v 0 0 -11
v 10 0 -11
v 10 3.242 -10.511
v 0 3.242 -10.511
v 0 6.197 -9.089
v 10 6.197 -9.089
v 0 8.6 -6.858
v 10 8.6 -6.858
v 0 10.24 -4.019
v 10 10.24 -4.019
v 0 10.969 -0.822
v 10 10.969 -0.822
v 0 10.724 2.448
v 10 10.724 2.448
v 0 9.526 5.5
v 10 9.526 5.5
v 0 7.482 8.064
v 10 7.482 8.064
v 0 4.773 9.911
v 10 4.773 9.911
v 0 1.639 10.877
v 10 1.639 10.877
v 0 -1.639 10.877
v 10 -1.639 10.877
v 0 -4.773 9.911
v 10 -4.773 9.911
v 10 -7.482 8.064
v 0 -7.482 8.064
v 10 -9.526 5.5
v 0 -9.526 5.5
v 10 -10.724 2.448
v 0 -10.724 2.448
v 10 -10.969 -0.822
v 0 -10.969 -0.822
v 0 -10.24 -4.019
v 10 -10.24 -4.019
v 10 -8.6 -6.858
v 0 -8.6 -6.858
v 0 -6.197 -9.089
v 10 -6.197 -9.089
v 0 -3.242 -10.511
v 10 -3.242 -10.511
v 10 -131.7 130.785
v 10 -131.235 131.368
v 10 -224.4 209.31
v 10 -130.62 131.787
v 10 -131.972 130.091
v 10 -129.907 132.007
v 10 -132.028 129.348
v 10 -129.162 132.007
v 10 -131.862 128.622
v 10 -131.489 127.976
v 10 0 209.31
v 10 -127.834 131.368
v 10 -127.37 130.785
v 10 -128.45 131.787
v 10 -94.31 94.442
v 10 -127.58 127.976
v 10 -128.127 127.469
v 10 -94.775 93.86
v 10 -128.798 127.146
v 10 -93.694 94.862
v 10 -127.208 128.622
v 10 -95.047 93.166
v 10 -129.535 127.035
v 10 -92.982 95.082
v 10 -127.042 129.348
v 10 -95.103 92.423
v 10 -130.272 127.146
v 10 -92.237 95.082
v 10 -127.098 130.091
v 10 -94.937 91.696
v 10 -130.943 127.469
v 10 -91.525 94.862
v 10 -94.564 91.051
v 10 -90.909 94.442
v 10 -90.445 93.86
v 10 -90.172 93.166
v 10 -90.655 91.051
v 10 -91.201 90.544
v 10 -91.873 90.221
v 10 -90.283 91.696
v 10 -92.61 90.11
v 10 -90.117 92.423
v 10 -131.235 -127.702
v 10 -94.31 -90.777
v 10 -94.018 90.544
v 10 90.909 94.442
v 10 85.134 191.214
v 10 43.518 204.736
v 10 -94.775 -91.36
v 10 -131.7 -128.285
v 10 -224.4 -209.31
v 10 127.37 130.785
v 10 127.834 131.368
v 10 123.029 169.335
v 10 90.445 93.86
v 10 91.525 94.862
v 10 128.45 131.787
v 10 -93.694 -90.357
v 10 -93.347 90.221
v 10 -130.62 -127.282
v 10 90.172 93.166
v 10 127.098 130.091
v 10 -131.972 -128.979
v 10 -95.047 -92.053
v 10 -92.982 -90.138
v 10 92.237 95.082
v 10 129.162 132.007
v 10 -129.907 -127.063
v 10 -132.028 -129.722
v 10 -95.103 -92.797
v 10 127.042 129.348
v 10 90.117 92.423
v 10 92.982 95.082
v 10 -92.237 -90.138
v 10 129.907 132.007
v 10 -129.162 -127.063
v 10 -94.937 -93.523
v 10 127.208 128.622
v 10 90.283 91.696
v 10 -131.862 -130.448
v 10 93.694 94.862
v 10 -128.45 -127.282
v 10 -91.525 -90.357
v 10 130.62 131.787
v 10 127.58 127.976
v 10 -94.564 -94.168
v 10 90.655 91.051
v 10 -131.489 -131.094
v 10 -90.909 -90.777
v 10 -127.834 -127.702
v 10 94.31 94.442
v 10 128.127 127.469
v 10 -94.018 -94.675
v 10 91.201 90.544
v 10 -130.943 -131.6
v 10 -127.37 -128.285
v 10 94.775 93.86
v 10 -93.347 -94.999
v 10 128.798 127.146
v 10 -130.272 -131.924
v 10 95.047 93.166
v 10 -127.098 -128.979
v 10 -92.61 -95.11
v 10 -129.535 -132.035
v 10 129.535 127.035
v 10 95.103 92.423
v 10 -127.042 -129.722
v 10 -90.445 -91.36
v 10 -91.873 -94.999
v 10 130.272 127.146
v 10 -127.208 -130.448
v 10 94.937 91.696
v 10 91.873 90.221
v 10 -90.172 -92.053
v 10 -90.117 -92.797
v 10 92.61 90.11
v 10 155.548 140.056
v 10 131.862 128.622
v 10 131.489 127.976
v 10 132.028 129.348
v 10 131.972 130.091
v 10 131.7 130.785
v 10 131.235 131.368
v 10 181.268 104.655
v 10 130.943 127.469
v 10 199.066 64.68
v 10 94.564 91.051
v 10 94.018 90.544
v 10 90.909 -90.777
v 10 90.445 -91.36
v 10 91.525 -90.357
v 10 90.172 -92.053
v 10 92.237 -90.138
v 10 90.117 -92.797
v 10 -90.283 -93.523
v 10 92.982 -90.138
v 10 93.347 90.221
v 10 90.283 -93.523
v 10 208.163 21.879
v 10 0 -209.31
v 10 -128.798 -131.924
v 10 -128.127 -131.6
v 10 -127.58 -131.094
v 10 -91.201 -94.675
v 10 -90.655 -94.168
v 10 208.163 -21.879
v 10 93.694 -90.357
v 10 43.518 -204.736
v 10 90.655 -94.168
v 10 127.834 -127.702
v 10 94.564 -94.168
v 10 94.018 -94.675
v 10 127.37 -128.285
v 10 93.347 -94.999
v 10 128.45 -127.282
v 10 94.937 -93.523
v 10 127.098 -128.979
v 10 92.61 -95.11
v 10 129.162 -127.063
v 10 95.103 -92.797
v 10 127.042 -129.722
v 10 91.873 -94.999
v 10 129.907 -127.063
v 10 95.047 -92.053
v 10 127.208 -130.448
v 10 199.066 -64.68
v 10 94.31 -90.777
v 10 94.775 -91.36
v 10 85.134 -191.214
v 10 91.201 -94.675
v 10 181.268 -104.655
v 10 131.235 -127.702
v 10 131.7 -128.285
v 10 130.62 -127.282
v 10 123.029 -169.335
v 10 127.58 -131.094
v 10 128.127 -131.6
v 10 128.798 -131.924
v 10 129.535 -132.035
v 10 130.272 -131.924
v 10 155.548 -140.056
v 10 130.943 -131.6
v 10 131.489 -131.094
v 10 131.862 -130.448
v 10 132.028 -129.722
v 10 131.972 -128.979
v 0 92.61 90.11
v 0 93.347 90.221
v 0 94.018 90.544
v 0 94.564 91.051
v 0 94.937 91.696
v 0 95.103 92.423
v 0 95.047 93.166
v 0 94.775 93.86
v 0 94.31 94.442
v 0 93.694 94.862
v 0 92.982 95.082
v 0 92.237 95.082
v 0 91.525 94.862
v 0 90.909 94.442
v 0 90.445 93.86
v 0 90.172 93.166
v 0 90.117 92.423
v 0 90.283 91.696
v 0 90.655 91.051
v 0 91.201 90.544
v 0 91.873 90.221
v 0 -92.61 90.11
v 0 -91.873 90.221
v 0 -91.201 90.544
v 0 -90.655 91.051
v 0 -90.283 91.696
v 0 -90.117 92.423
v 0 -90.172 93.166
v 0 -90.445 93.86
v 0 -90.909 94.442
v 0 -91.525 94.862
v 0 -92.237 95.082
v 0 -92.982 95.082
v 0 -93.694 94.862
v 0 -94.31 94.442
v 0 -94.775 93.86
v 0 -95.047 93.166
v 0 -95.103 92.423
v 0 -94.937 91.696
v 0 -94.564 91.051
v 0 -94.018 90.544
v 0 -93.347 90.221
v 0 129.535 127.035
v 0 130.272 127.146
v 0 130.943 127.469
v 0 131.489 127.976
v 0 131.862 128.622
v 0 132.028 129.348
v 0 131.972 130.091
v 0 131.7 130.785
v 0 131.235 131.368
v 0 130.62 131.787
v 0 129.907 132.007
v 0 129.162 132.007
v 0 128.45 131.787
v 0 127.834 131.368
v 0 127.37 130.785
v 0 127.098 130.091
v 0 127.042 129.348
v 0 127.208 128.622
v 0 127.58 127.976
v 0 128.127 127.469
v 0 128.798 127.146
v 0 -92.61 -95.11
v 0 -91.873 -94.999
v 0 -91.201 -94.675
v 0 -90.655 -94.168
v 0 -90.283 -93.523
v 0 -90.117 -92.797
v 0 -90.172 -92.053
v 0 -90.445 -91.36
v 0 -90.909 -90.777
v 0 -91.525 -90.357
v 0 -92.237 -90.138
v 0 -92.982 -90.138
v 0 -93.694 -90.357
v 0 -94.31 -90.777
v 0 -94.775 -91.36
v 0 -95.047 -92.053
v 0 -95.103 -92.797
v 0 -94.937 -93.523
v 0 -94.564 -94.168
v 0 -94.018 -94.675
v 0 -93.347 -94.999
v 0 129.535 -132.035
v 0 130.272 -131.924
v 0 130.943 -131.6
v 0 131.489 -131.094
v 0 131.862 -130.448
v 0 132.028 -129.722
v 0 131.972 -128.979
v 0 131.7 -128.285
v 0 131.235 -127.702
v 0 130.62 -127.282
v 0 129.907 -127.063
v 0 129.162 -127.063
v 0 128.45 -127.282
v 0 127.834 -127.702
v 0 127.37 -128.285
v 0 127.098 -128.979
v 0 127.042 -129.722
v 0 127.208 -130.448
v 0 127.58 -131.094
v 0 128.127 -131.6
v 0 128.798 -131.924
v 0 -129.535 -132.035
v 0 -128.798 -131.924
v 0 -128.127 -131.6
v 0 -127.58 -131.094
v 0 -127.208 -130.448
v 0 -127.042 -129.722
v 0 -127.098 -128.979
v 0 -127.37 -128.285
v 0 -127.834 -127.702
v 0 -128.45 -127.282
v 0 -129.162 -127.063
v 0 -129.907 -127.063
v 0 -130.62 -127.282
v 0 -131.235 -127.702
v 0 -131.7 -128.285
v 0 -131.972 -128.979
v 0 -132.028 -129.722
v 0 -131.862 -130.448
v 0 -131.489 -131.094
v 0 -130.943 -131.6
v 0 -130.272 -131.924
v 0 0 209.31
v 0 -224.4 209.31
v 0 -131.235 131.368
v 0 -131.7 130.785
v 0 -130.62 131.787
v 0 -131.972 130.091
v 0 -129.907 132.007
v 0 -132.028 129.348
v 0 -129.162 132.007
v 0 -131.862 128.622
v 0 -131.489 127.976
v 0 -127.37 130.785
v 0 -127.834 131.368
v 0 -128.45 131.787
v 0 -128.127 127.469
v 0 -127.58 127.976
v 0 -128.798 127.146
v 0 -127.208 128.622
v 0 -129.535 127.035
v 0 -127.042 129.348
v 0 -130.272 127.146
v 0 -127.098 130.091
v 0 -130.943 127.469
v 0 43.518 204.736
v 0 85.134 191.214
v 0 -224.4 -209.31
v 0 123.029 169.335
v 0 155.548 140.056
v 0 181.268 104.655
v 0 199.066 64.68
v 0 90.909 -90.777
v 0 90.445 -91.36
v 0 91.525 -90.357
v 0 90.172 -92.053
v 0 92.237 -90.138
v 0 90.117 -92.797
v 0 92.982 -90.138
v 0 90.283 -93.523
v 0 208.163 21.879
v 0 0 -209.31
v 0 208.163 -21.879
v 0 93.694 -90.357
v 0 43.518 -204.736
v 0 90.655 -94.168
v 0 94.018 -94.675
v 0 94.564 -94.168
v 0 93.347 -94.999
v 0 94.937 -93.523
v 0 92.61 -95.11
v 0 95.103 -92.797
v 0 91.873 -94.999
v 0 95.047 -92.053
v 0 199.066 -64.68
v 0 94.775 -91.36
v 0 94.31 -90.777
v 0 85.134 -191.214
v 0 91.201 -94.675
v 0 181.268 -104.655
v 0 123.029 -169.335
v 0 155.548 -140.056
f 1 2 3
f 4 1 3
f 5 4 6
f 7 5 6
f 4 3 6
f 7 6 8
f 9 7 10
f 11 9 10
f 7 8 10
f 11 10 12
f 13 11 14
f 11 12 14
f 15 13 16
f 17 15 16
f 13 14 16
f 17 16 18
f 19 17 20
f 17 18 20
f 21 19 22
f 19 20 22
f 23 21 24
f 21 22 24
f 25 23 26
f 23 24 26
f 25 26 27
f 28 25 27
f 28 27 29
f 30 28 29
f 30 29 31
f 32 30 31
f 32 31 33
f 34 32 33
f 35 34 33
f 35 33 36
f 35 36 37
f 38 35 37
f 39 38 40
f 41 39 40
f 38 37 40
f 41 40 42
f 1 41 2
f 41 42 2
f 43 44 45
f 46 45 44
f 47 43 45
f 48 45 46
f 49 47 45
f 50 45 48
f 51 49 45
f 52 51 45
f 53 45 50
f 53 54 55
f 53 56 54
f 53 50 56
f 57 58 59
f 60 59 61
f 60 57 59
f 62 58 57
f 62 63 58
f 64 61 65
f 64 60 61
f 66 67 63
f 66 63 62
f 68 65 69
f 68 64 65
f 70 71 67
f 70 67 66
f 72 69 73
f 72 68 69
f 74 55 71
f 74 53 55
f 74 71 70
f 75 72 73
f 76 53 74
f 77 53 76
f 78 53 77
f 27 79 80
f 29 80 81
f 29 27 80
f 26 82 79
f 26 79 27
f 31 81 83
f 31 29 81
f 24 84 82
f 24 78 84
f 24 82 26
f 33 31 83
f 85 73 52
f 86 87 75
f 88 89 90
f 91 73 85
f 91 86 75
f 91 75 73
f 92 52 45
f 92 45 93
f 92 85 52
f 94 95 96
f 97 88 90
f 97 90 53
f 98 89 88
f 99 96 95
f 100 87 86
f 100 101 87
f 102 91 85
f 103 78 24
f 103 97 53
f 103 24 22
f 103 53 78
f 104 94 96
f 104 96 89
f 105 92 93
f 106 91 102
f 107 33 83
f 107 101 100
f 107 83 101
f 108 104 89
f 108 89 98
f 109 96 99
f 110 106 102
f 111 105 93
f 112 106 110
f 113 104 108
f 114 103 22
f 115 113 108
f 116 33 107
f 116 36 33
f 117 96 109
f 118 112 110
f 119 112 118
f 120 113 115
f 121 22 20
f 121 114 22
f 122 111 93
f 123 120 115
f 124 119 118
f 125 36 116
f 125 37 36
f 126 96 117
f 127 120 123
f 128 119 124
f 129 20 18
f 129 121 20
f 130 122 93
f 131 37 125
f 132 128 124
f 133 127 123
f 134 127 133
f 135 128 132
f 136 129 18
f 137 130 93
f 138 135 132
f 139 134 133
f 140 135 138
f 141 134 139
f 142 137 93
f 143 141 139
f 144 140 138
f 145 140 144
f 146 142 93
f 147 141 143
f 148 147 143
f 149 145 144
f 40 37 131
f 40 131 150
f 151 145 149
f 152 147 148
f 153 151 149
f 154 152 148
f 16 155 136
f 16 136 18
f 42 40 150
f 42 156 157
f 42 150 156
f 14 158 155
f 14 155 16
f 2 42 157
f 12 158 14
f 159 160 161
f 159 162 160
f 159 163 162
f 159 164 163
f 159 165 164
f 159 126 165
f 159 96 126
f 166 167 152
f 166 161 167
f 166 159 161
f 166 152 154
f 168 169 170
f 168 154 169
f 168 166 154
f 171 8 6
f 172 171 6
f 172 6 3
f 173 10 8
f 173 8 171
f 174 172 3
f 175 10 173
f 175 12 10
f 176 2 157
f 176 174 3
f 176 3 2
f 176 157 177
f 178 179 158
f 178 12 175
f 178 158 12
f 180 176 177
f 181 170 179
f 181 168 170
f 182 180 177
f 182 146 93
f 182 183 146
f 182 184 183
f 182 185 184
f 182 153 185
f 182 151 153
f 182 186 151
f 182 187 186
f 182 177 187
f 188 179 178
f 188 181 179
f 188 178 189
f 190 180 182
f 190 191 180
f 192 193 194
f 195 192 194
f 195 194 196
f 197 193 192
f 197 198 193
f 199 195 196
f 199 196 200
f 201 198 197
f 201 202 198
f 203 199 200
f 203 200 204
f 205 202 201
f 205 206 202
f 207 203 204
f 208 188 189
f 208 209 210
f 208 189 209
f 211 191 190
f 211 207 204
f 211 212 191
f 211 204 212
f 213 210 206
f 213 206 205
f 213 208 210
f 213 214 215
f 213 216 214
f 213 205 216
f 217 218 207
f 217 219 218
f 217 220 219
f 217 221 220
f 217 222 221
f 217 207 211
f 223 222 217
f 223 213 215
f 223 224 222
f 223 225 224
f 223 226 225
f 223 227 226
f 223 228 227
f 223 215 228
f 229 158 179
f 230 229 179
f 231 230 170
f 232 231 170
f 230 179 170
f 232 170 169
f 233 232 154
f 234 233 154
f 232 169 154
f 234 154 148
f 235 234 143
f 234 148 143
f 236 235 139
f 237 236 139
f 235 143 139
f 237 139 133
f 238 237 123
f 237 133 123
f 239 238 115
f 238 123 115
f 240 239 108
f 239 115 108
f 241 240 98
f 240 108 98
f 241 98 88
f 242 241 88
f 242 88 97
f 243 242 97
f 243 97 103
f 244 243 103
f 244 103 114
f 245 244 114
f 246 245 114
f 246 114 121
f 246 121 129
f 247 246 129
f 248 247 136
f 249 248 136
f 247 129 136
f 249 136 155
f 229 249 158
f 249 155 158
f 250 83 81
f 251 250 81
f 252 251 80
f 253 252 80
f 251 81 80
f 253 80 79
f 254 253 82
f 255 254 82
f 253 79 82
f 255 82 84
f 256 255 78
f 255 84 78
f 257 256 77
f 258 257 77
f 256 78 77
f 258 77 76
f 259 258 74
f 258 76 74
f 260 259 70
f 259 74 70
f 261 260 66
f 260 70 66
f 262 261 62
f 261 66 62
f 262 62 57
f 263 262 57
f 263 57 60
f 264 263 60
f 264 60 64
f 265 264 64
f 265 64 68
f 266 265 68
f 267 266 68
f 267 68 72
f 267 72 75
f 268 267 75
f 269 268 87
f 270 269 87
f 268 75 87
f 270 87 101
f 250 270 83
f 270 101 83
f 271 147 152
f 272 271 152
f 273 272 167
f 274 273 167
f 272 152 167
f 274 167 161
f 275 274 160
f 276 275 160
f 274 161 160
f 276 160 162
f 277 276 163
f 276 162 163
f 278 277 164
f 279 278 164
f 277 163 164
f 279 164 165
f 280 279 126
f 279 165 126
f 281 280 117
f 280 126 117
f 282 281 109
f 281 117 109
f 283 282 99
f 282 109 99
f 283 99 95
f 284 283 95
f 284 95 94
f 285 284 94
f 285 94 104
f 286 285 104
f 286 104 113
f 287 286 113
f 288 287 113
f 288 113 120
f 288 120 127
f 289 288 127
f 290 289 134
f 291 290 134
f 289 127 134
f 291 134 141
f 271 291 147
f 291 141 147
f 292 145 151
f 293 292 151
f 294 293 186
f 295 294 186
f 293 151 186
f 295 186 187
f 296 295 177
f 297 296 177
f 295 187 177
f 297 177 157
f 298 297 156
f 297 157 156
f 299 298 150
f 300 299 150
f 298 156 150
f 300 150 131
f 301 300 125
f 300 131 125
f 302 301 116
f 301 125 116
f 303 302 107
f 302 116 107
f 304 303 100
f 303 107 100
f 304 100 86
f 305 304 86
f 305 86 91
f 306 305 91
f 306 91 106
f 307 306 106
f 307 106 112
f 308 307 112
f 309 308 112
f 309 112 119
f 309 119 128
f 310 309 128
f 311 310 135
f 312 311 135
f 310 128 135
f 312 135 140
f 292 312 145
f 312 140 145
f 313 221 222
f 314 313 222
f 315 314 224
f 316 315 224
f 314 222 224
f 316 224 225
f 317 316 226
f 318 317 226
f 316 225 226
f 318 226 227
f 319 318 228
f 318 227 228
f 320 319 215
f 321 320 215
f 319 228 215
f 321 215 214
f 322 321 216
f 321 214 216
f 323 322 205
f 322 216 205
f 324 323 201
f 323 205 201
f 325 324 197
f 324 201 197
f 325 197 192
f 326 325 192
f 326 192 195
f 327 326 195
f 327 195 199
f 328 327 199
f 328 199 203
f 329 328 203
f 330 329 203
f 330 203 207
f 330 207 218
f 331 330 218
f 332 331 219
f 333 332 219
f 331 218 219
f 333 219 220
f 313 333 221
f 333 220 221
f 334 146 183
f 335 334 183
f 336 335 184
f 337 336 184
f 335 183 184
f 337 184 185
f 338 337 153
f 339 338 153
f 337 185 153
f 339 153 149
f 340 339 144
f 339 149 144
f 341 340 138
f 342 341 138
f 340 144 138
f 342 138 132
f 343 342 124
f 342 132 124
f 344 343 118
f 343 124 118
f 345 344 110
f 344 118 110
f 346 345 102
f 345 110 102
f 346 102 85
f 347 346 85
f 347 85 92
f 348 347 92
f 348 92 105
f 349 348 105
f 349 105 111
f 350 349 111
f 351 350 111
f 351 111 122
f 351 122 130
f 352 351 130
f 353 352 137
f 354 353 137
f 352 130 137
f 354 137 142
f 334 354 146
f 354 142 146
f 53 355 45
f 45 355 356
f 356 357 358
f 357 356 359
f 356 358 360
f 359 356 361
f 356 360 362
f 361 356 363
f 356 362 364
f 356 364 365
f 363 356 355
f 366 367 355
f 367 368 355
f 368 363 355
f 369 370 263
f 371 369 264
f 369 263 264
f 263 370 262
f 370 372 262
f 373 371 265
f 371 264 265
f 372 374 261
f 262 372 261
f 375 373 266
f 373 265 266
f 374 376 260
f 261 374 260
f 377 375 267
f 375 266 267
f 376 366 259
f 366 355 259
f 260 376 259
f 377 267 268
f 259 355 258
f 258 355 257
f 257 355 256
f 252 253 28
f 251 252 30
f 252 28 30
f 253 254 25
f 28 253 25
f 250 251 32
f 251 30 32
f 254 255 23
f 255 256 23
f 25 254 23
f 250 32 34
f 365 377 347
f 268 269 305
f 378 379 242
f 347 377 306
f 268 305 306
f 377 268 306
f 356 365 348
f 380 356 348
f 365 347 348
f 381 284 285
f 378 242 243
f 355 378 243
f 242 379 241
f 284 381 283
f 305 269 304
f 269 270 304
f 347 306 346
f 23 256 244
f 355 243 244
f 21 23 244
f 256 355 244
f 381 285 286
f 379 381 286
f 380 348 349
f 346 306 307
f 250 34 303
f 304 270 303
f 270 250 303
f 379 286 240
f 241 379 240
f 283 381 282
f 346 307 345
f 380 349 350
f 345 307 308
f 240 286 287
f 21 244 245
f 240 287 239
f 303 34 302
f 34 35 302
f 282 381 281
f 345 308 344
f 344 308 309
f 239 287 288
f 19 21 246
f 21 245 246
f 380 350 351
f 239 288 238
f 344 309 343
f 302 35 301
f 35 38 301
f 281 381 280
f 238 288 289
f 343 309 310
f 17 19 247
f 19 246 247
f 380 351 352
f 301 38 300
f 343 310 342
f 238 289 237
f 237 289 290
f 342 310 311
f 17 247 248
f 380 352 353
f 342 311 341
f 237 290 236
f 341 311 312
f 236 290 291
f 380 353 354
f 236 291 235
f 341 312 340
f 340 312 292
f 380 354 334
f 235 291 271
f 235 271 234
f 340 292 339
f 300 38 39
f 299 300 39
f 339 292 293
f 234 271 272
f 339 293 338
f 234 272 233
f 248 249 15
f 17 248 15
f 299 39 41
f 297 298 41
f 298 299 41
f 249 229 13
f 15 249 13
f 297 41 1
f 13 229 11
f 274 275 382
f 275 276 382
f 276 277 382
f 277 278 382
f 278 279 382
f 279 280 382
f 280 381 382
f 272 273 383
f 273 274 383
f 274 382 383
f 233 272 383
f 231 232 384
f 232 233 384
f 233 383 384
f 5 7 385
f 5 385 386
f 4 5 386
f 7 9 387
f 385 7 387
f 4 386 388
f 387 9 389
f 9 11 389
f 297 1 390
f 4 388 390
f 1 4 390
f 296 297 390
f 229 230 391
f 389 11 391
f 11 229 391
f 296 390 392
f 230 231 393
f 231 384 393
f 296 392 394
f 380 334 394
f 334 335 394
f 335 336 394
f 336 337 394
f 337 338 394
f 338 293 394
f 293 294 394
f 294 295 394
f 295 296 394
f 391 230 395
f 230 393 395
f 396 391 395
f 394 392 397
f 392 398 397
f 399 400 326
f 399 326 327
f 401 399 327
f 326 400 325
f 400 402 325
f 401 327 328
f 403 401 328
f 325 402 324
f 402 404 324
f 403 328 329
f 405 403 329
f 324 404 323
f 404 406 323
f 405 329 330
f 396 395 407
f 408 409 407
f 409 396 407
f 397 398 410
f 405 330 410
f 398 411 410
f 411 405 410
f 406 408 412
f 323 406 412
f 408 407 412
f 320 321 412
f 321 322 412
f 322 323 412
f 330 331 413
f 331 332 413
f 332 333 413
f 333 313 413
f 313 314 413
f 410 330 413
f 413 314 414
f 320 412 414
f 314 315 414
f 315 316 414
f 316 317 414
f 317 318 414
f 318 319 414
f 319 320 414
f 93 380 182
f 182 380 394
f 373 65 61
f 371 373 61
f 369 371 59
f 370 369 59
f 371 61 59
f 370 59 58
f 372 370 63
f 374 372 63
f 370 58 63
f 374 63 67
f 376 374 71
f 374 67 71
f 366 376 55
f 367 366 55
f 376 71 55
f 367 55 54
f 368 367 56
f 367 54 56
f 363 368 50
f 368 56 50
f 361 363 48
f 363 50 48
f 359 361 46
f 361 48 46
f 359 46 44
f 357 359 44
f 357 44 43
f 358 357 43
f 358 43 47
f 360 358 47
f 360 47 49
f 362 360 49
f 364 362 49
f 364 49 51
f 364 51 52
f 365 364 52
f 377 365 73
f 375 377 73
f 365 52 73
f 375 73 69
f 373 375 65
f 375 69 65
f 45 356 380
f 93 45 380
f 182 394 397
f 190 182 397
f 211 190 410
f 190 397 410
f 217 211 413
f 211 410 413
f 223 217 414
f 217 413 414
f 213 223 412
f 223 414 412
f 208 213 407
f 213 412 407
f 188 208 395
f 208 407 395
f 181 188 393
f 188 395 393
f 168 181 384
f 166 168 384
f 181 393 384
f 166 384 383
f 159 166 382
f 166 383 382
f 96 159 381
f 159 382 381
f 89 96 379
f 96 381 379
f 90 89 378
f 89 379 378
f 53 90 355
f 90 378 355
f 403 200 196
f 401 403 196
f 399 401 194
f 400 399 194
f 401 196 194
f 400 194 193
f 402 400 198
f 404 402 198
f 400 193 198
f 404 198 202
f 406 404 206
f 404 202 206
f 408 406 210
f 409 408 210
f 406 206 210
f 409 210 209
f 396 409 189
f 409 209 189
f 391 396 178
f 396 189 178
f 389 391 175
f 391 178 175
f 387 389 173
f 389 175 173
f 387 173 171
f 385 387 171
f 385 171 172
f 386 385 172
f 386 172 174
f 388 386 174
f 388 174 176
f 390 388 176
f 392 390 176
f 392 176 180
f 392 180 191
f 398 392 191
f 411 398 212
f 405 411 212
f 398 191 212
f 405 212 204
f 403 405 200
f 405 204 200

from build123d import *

# Parameters (mm, degrees)
BOSS_EXTRUDE1_DEPTH = 10
SKETCH2_R           = 2.5
CUT_EXTRUDE1_DEPTH  = 10
SKETCH3_R           = 11
CUT_EXTRUDE2_DEPTH  = 10


with BuildPart() as part:
    # Sketch1 → Boss-Extrude1 (new body)
    with BuildSketch(Plane(origin=(0, 0, 0), x_dir=(0, 0, -1), z_dir=(1, 0, 0))):
        with BuildLine():
            ThreePointArc((-209.31, 0), (0, -209.31), (209.31, 0))
            Line((209.31, 0), (-209.31, 0))
        make_face()
        with BuildLine():
            Line((-209.31, 0), (209.31, 0))
            ThreePointArc((209.31, 0), (0, 209.31), (-209.31, 0))
        make_face()
        with BuildLine():
            Line((-209.31, -224.4), (209.31, -224.4))
            Line((209.31, -224.4), (209.31, 0))
            ThreePointArc((209.31, 0), (0, -209.31), (-209.31, 0))
            Line((-209.31, 0), (-209.31, -224.4))
        make_face()
    extrude(amount=BOSS_EXTRUDE1_DEPTH)

    # Sketch2 → Cut-Extrude1 (cut)
    with BuildSketch(Plane(origin=(10, 0, 0), x_dir=(0, 0, -1), z_dir=(1, 0, 0))):
        with Locations((129.534891246, 129.534891246)):
            Circle(SKETCH2_R)
        with Locations((92.609775132, 92.609775132)):
            Circle(SKETCH2_R)
        with Locations((92.609775132, -92.609775132)):
            Circle(SKETCH2_R)
        with Locations((129.534891246, -129.534891246)):
            Circle(SKETCH2_R)
        with Locations((-92.609775132, -92.609775132)):
            Circle(SKETCH2_R)
        with Locations((-129.534891246, -129.534891246)):
            Circle(SKETCH2_R)
        with Locations((-92.609775132, 92.609775132)):
            Circle(SKETCH2_R)
        with Locations((-129.534891246, 129.534891246)):
            Circle(SKETCH2_R)
    extrude(amount=-CUT_EXTRUDE1_DEPTH, mode=Mode.SUBTRACT)

    # Sketch3 → Cut-Extrude2 (cut)
    with BuildSketch(Plane(origin=(10, 0, 0), x_dir=(0, 0, -1), z_dir=(1, 0, 0))):
        Circle(SKETCH3_R)
    extrude(amount=-CUT_EXTRUDE2_DEPTH, mode=Mode.SUBTRACT)


solid = part.part
